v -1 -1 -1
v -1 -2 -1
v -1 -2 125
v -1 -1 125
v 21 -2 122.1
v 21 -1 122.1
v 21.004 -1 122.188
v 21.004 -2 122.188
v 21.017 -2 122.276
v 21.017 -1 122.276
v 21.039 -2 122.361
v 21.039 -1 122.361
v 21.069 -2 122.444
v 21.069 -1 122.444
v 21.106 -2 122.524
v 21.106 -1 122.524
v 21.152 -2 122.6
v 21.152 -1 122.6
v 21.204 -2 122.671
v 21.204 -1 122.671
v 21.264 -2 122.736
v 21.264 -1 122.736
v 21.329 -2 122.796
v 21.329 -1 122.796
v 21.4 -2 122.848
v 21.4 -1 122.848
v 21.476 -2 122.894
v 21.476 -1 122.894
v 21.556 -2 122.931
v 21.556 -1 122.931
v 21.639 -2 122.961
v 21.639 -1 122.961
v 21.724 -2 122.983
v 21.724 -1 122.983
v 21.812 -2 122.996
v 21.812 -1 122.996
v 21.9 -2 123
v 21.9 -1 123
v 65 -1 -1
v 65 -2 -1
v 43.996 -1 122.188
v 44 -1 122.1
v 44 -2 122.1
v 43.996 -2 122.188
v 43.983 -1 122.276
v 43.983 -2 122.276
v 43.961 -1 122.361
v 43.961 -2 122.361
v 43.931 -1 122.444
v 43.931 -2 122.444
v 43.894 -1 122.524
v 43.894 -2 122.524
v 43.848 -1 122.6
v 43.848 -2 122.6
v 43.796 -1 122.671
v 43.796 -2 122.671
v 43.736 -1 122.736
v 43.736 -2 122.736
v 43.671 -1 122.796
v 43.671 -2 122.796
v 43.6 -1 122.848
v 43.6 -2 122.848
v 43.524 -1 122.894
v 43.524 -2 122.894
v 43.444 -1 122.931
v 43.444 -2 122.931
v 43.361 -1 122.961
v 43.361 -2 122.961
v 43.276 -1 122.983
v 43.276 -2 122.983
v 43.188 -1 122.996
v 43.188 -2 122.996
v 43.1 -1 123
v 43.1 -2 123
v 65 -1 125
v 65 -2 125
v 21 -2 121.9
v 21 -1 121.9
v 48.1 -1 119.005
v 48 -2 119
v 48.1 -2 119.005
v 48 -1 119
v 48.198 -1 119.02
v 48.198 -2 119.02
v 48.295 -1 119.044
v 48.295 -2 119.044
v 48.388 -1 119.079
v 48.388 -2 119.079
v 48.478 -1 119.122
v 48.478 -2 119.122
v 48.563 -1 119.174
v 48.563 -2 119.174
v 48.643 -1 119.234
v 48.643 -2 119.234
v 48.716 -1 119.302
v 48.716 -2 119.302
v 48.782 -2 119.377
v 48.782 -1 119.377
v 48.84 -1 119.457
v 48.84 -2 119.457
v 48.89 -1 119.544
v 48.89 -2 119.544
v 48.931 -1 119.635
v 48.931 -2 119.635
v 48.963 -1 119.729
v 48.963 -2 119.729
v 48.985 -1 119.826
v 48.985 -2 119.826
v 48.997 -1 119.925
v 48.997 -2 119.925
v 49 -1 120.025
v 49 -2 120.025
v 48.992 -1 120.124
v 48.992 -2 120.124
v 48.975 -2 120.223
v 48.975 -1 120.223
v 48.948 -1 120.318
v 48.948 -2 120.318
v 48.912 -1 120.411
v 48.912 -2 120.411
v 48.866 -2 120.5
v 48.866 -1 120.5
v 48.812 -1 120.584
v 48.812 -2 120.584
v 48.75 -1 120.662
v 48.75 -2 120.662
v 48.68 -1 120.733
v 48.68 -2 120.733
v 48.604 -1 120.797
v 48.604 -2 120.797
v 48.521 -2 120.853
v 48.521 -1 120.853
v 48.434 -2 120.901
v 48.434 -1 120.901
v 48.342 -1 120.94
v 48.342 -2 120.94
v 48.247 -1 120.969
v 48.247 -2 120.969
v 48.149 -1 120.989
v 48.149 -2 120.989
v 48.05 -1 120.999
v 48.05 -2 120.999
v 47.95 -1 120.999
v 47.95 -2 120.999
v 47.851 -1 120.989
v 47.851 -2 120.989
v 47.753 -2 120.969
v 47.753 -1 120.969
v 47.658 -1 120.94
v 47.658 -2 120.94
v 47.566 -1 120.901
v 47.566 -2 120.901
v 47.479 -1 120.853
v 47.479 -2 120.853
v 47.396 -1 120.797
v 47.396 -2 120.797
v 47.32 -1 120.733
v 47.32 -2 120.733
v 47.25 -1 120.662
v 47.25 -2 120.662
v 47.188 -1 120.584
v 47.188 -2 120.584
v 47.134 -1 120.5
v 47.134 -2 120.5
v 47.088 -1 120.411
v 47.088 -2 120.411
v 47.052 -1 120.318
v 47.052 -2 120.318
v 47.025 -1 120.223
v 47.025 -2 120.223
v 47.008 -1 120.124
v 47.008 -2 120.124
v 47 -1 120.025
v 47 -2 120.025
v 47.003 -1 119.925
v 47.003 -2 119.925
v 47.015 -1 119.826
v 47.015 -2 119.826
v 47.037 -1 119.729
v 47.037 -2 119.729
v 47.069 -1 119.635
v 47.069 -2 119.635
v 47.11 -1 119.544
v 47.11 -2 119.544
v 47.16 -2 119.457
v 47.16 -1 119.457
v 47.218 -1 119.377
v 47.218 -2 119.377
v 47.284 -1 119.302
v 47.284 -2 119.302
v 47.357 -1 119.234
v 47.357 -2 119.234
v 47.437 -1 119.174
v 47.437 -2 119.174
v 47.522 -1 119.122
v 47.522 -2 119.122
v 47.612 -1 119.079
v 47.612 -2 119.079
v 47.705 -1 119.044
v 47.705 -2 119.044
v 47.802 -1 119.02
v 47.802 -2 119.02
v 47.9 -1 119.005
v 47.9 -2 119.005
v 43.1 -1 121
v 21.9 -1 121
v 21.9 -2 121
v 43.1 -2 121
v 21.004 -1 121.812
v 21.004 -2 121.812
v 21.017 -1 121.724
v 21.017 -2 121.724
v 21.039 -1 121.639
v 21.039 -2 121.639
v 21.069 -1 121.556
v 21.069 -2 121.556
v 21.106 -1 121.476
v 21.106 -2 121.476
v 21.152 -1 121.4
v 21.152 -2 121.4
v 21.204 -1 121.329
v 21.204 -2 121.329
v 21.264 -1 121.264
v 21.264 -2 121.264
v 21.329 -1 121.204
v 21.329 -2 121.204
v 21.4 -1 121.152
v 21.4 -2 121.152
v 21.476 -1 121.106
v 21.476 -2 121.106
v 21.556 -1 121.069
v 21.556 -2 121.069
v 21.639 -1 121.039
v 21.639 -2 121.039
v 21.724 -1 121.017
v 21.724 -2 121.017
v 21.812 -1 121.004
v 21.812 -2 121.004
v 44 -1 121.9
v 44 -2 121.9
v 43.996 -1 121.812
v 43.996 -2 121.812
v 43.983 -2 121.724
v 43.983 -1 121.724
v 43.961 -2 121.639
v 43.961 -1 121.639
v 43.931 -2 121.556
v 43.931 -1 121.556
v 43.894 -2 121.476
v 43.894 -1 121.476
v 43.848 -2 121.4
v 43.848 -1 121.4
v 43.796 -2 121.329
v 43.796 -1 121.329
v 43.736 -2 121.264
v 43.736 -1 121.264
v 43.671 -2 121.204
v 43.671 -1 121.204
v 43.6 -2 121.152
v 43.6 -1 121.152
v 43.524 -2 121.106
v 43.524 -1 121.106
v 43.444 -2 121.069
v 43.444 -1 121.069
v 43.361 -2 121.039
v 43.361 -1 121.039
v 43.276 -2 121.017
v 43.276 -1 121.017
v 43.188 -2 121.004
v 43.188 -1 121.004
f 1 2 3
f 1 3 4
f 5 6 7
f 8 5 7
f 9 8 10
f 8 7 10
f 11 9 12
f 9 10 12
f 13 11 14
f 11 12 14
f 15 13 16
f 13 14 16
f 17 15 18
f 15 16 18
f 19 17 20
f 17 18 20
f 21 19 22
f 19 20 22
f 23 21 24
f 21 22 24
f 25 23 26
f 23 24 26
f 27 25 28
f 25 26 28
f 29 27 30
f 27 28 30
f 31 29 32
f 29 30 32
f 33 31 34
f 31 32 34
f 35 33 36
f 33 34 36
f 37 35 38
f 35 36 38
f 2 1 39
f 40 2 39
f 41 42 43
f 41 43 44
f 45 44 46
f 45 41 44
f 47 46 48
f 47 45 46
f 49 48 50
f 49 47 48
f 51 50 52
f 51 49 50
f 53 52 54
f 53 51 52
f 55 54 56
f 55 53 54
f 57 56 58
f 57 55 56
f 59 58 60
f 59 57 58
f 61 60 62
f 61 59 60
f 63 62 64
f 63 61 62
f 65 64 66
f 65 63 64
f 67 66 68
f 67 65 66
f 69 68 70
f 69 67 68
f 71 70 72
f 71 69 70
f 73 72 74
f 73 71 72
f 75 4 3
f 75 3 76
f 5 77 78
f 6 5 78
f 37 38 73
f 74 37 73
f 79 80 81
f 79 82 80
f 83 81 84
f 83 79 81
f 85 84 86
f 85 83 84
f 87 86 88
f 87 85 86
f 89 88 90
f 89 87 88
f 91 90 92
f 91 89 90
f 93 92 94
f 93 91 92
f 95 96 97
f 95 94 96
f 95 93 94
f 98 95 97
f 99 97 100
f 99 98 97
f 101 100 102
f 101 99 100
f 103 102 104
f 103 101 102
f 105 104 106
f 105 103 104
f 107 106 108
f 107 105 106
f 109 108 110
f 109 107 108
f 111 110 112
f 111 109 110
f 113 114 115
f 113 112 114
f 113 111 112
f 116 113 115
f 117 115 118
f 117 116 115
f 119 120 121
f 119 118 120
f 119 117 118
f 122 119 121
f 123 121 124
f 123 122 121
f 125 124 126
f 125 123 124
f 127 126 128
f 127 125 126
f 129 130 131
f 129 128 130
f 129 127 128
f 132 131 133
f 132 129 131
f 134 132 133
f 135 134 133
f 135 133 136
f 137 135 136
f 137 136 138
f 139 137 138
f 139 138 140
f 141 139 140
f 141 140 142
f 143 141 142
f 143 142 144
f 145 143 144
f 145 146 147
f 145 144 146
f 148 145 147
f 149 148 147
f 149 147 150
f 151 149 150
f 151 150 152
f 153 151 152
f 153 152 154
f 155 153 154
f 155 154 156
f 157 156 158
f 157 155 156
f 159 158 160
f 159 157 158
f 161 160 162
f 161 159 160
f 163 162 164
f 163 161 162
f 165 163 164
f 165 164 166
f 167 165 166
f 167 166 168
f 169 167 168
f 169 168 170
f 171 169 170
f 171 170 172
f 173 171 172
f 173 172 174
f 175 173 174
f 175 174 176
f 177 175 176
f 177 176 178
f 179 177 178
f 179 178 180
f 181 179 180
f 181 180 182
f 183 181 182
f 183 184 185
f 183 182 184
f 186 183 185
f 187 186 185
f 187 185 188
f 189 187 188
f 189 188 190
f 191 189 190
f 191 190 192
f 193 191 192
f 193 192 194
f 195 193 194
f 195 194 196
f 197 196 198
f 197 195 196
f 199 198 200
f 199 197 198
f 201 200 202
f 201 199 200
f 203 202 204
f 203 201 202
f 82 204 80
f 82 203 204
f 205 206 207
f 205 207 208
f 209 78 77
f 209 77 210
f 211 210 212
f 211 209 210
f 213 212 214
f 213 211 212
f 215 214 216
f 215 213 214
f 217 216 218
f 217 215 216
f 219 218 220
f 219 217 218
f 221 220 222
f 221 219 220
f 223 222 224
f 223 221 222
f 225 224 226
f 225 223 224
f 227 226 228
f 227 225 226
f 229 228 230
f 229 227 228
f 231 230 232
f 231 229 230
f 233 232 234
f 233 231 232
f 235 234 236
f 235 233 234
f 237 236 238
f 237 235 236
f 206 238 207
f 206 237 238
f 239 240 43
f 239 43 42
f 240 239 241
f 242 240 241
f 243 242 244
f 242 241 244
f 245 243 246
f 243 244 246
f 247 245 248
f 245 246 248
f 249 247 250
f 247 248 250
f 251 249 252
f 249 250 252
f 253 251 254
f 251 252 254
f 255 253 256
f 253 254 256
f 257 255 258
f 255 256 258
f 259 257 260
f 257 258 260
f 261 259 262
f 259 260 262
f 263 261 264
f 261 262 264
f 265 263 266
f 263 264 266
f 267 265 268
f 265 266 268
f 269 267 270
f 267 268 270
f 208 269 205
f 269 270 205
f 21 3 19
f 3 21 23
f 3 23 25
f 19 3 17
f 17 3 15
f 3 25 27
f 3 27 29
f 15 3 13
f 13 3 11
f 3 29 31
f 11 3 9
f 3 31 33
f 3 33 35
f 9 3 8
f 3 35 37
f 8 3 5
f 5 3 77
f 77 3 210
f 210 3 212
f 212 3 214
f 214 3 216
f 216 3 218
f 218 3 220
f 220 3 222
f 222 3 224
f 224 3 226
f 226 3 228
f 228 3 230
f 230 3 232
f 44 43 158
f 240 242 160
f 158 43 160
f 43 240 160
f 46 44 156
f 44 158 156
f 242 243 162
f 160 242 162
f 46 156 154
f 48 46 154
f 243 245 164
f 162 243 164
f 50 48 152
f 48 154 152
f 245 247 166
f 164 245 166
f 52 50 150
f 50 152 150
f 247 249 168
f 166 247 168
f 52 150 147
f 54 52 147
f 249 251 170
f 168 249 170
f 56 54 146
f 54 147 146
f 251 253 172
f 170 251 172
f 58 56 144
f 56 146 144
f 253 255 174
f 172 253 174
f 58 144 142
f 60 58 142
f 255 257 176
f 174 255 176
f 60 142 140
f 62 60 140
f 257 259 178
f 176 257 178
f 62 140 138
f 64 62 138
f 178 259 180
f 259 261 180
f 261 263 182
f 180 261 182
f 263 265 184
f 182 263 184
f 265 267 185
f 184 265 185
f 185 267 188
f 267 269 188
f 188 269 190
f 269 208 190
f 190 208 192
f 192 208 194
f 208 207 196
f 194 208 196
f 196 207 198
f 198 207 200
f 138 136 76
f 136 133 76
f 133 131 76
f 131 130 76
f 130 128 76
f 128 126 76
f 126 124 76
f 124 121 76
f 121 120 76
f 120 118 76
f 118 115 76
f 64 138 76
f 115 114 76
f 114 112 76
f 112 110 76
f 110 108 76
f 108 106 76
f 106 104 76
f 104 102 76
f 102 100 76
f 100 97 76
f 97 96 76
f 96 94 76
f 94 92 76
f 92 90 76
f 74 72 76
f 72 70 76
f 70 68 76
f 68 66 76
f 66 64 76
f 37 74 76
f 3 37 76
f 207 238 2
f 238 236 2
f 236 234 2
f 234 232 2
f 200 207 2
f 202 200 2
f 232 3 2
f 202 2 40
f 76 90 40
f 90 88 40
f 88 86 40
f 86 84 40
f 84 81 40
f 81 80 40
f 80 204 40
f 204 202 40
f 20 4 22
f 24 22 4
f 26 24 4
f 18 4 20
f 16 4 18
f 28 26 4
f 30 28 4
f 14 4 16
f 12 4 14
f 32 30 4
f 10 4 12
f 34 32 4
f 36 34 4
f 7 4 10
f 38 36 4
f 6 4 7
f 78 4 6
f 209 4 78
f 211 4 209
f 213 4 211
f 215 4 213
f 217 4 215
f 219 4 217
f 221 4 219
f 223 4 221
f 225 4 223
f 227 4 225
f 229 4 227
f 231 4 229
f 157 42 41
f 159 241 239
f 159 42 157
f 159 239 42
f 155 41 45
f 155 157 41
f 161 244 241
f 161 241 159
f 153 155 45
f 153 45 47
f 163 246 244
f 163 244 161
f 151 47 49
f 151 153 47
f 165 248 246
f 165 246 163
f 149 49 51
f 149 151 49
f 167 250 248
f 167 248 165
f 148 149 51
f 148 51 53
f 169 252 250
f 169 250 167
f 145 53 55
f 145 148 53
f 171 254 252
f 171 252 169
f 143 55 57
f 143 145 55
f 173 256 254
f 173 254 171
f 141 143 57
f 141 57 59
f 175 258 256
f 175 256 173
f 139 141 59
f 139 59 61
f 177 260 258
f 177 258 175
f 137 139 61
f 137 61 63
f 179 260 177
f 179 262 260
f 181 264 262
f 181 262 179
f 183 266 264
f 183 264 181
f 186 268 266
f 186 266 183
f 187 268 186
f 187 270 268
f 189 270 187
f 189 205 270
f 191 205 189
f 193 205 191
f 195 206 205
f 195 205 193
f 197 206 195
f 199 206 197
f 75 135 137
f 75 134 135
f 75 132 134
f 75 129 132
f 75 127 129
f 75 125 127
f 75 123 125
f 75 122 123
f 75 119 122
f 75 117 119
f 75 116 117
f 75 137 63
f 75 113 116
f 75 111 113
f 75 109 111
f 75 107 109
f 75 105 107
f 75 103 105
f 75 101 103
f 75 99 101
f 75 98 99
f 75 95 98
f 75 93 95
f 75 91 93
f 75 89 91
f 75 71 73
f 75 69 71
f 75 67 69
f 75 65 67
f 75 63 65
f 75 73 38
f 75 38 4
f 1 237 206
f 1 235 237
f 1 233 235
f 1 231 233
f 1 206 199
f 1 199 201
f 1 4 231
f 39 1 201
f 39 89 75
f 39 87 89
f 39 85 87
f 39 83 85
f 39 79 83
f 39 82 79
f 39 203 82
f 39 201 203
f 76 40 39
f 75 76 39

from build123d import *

# Parameters (mm, degrees)
CYLINDER001_R     = 1
CYLINDER001_DEPTH = 10
BOX002_W          = 23
BOX002_H          = 10
BOX002_DEPTH      = 2
FILLET_R          = 0.9
CYLINDER_R        = 1
CYLINDER_DEPTH    = 2
BOX005_W          = 66
BOX005_H          = 1
BOX005_DEPTH      = 126


with BuildPart() as cilindro001:
    # Cylinder001 → Cylinder001 (new body)
    with BuildSketch(Plane(origin=(48, 3, 120), x_dir=(0, 0, -1), z_dir=(0, -1, 0))):
        Circle(CYLINDER001_R)
    extrude(amount=CYLINDER001_DEPTH)


with BuildPart() as fillet_body:
    # Box002 → Box002 (new body)
    with BuildSketch(Plane(origin=(21, -2, 121), x_dir=(1, 0, 0), z_dir=(0, 0, 1))):
        with Locations((11.5, 5)):
            Rectangle(BOX002_W, BOX002_H)
    extrude(amount=BOX002_DEPTH)

    # Fillet
    fillet_edges = [fillet_body.edges().sort_by_distance(p)[0] for p in [
        (21, 3, 123),
        (21, 3, 121),
        (44, 3, 123),
        (44, 3, 121),
    ]]
    fillet(fillet_edges, radius=FILLET_R)


with BuildPart() as fillet_body_1:
    # Fillet placement: moved
    add(fillet_body.part.moved(Location((0, -6, 0))))


with BuildPart() as cilindro:
    # Cylinder → Cylinder (new body)
    with BuildSketch(Plane(origin=(32, 2, 118), x_dir=(0, 0, -1), z_dir=(0, -1, 0))):
        Circle(CYLINDER_R)
    extrude(amount=CYLINDER_DEPTH)


with BuildPart() as screen_protector:
    # Box005 → Box005 (new body)
    with BuildSketch(Plane(origin=(-1, -2, -1), x_dir=(1, 0, 0), z_dir=(0, 0, 1))):
        with Locations((33, 0.5)):
            Rectangle(BOX005_W, BOX005_H)
    extrude(amount=BOX005_DEPTH)

    # Cut004: cut Cilindro
    add(cilindro.part, mode=Mode.SUBTRACT)

    # Cut005: cut Fillet body
    add(fillet_body_1.part, mode=Mode.SUBTRACT)

    # Cut016: cut Cilindro001
    add(cilindro001.part, mode=Mode.SUBTRACT)


solid = screen_protector.part
